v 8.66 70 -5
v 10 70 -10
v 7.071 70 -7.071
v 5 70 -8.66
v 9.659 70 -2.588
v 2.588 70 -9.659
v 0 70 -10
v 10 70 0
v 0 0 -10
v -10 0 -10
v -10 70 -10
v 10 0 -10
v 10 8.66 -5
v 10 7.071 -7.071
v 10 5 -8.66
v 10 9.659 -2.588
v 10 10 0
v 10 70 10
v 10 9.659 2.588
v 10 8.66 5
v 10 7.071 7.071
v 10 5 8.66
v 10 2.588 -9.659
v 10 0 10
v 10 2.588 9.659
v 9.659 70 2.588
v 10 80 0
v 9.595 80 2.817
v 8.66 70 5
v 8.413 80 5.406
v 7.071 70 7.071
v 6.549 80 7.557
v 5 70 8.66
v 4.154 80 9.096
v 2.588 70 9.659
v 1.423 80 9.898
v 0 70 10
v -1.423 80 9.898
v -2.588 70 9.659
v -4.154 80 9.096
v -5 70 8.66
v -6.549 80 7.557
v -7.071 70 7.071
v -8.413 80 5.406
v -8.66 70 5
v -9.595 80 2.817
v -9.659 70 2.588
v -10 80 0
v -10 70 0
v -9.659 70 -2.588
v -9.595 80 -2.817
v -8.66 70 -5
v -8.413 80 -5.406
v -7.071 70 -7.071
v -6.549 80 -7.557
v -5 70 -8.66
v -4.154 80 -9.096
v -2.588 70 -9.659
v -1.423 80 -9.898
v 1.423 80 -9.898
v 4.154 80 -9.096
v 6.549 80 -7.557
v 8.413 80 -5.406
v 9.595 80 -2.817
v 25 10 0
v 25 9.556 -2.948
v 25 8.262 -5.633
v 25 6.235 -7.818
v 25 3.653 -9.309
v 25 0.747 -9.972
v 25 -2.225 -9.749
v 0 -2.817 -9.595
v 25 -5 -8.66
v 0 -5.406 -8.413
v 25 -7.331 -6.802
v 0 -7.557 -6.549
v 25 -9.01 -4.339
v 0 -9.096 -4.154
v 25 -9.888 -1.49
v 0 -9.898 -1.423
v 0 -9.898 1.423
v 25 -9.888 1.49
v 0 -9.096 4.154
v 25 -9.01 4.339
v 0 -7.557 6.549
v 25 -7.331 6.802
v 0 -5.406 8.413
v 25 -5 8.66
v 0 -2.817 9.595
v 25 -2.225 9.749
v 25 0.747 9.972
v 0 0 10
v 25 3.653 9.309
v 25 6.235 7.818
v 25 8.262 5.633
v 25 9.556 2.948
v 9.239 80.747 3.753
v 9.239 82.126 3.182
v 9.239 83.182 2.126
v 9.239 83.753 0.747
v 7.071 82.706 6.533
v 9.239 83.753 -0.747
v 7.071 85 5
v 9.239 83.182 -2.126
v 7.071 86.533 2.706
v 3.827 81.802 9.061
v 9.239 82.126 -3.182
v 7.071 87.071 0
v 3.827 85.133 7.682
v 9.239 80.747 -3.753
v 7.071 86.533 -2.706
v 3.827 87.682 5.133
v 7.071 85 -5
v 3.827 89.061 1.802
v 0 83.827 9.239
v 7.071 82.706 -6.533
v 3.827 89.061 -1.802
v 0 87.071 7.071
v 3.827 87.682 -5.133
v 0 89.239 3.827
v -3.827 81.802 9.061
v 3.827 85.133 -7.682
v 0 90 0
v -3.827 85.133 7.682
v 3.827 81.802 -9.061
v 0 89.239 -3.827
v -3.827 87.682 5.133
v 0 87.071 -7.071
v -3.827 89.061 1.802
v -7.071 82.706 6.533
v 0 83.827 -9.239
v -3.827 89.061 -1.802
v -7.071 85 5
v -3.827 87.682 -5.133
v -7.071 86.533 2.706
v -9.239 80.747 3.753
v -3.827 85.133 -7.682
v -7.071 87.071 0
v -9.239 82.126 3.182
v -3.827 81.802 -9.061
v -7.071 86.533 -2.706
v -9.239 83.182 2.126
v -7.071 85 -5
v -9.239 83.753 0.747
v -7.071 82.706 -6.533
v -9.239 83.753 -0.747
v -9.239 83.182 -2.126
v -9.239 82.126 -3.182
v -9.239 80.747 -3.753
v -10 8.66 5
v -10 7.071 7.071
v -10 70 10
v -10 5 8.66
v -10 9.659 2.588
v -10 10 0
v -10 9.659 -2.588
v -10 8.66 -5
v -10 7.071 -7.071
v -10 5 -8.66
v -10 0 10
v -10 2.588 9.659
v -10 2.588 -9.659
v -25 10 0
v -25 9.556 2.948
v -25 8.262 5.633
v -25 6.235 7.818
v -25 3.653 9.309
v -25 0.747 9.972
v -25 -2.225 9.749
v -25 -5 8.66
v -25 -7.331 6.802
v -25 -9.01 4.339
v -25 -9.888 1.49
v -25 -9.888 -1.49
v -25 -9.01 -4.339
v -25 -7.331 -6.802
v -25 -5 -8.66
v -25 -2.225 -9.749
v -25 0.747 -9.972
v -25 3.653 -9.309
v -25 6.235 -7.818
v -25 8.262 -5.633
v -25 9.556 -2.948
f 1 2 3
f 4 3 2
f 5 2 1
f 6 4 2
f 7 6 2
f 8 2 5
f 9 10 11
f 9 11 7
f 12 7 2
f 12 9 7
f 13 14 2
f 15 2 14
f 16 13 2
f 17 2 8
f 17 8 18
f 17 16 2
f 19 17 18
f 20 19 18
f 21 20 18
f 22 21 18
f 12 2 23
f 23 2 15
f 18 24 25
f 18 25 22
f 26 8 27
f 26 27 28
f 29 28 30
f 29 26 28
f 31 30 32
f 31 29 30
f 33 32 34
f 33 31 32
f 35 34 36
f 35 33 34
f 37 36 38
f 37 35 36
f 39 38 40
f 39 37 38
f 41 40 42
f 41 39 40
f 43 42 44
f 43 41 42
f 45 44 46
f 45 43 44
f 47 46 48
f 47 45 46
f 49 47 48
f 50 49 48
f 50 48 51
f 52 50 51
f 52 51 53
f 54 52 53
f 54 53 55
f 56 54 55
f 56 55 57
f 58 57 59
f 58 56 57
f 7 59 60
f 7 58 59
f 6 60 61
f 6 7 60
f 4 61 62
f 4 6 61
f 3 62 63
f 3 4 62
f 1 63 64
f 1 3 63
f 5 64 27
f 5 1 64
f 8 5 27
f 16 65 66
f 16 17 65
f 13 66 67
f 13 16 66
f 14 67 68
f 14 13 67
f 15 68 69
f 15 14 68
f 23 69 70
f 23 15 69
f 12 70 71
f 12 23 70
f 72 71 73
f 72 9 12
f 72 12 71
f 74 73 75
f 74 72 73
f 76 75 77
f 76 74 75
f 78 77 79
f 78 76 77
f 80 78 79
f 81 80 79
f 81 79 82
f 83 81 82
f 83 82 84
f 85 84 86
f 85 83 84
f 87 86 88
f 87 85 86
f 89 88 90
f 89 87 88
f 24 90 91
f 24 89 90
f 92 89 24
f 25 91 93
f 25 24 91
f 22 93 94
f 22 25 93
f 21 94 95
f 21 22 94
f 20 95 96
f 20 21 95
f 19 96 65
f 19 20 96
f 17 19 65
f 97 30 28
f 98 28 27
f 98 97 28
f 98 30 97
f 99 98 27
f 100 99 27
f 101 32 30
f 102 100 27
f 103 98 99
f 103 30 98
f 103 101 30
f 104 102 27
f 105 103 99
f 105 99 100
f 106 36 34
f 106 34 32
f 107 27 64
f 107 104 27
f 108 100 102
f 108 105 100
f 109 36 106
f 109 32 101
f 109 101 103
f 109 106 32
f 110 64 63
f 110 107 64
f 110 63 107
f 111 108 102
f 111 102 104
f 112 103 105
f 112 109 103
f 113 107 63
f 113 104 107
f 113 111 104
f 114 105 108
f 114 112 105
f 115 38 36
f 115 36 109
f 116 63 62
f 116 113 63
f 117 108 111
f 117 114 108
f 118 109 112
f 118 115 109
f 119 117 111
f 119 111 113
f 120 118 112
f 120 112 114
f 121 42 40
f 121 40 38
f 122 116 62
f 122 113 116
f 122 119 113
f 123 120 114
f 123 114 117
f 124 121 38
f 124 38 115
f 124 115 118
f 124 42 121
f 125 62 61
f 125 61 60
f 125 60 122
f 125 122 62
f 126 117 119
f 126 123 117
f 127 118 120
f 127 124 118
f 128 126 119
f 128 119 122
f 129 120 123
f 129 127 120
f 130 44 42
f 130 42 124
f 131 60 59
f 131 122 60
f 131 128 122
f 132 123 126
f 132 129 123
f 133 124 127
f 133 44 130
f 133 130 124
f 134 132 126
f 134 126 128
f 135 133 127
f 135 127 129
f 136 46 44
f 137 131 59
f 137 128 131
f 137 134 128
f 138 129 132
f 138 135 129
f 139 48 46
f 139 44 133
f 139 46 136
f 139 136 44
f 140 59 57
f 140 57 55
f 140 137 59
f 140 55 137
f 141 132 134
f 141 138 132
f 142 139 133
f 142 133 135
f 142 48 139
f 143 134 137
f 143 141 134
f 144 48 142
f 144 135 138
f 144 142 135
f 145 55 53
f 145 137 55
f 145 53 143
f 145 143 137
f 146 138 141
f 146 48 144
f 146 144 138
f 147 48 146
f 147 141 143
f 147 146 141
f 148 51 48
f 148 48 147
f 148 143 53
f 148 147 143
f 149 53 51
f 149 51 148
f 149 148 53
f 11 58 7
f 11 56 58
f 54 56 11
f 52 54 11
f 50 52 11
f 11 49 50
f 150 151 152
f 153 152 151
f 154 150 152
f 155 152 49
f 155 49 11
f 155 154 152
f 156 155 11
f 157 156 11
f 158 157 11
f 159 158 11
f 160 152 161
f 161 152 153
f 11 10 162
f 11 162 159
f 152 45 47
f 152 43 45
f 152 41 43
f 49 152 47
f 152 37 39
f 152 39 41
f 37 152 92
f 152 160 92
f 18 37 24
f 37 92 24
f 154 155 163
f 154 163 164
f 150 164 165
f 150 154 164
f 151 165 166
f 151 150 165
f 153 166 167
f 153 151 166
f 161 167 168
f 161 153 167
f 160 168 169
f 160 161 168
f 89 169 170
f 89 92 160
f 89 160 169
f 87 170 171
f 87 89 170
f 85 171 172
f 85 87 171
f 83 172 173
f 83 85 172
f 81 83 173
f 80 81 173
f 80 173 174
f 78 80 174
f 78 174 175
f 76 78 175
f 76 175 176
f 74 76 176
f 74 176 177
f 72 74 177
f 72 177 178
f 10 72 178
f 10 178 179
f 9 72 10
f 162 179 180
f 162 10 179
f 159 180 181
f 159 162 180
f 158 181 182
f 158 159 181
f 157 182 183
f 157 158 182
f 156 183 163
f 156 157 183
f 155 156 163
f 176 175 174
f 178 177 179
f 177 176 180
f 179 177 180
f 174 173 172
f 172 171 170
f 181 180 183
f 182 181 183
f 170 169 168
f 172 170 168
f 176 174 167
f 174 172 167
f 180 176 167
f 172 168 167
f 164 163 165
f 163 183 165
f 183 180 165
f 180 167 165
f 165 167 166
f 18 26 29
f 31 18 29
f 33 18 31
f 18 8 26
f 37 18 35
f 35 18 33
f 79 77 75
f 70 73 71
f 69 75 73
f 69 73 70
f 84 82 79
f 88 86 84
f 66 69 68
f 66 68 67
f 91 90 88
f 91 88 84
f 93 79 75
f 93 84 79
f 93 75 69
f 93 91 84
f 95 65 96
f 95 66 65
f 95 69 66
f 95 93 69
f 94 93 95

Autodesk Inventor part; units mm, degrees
ref_plane "YZ Plane" through (0, 0, 0) normal (1, 0, 0) x (0, 1, 0)
ref_plane "XZ Plane" through (0, 0, 0) normal (0, 1, 0) x (-1, 0, 0)
ref_plane "XY Plane" through (0, 0, 0) normal (0, 0, 1) x (1, 0, 0)
sketch "스케치5" plane through (0, 0, 0) normal (1, 0, 0) x (0, 1, 0)
  circle A0 centre (0, 0) radius 10
  dimension "d11" = 20
extrude "돌출4" add sketch "스케치5" along normal mid plane 50
sketch "스케치6" plane through (0, 0, 0) normal (0, 1, 0) x (-1, 0, 0)
  line L0 (25, 10) -> (-25, 10) projected
  line L1 (25, -10) -> (-25, -10) projected
  line L2 (-10, 10) -> (10, 10)
  line L3 (10, 10) -> (10, -10)
  line L4 (10, -10) -> (-10, -10)
  line L5 (-10, -10) -> (-10, 10)
  line L6 (25, -10) -> (25, 10) projected
  point P0 (0, 0)
  dimension "d14" = 20
  dimension "d15" = 15
extrude "돌출5" add sketch "스케치6" along normal blind 70 contours L3 L1 L5 L0
sketch "스케치7" plane through (0, 70, 0) normal (0, 1, 0) x (1, 0, 0)
  circle A0 centre (0, 0) radius 10
  dimension "d18" = 20
extrude "돌출6" add sketch "스케치7" along normal blind 10
sketch "스케치8" plane through (0, 80, 0) normal (0, 1, 0) x (1, 0, 0)
  circle A0 centre (0, 0) radius 10 projected
  line L0 (10, -10) -> (10, 0) projected
  line L1 (-10, 0) -> (10, 0)
revolve "회전2" add sketch "스케치8" angle 360 about axis through (-10, 80, 0) along (1, 0, 0) picked at (2.495, 2.2104) contours L1 A0
properties part number "L3_0.1" material "ABS 플라스틱"
